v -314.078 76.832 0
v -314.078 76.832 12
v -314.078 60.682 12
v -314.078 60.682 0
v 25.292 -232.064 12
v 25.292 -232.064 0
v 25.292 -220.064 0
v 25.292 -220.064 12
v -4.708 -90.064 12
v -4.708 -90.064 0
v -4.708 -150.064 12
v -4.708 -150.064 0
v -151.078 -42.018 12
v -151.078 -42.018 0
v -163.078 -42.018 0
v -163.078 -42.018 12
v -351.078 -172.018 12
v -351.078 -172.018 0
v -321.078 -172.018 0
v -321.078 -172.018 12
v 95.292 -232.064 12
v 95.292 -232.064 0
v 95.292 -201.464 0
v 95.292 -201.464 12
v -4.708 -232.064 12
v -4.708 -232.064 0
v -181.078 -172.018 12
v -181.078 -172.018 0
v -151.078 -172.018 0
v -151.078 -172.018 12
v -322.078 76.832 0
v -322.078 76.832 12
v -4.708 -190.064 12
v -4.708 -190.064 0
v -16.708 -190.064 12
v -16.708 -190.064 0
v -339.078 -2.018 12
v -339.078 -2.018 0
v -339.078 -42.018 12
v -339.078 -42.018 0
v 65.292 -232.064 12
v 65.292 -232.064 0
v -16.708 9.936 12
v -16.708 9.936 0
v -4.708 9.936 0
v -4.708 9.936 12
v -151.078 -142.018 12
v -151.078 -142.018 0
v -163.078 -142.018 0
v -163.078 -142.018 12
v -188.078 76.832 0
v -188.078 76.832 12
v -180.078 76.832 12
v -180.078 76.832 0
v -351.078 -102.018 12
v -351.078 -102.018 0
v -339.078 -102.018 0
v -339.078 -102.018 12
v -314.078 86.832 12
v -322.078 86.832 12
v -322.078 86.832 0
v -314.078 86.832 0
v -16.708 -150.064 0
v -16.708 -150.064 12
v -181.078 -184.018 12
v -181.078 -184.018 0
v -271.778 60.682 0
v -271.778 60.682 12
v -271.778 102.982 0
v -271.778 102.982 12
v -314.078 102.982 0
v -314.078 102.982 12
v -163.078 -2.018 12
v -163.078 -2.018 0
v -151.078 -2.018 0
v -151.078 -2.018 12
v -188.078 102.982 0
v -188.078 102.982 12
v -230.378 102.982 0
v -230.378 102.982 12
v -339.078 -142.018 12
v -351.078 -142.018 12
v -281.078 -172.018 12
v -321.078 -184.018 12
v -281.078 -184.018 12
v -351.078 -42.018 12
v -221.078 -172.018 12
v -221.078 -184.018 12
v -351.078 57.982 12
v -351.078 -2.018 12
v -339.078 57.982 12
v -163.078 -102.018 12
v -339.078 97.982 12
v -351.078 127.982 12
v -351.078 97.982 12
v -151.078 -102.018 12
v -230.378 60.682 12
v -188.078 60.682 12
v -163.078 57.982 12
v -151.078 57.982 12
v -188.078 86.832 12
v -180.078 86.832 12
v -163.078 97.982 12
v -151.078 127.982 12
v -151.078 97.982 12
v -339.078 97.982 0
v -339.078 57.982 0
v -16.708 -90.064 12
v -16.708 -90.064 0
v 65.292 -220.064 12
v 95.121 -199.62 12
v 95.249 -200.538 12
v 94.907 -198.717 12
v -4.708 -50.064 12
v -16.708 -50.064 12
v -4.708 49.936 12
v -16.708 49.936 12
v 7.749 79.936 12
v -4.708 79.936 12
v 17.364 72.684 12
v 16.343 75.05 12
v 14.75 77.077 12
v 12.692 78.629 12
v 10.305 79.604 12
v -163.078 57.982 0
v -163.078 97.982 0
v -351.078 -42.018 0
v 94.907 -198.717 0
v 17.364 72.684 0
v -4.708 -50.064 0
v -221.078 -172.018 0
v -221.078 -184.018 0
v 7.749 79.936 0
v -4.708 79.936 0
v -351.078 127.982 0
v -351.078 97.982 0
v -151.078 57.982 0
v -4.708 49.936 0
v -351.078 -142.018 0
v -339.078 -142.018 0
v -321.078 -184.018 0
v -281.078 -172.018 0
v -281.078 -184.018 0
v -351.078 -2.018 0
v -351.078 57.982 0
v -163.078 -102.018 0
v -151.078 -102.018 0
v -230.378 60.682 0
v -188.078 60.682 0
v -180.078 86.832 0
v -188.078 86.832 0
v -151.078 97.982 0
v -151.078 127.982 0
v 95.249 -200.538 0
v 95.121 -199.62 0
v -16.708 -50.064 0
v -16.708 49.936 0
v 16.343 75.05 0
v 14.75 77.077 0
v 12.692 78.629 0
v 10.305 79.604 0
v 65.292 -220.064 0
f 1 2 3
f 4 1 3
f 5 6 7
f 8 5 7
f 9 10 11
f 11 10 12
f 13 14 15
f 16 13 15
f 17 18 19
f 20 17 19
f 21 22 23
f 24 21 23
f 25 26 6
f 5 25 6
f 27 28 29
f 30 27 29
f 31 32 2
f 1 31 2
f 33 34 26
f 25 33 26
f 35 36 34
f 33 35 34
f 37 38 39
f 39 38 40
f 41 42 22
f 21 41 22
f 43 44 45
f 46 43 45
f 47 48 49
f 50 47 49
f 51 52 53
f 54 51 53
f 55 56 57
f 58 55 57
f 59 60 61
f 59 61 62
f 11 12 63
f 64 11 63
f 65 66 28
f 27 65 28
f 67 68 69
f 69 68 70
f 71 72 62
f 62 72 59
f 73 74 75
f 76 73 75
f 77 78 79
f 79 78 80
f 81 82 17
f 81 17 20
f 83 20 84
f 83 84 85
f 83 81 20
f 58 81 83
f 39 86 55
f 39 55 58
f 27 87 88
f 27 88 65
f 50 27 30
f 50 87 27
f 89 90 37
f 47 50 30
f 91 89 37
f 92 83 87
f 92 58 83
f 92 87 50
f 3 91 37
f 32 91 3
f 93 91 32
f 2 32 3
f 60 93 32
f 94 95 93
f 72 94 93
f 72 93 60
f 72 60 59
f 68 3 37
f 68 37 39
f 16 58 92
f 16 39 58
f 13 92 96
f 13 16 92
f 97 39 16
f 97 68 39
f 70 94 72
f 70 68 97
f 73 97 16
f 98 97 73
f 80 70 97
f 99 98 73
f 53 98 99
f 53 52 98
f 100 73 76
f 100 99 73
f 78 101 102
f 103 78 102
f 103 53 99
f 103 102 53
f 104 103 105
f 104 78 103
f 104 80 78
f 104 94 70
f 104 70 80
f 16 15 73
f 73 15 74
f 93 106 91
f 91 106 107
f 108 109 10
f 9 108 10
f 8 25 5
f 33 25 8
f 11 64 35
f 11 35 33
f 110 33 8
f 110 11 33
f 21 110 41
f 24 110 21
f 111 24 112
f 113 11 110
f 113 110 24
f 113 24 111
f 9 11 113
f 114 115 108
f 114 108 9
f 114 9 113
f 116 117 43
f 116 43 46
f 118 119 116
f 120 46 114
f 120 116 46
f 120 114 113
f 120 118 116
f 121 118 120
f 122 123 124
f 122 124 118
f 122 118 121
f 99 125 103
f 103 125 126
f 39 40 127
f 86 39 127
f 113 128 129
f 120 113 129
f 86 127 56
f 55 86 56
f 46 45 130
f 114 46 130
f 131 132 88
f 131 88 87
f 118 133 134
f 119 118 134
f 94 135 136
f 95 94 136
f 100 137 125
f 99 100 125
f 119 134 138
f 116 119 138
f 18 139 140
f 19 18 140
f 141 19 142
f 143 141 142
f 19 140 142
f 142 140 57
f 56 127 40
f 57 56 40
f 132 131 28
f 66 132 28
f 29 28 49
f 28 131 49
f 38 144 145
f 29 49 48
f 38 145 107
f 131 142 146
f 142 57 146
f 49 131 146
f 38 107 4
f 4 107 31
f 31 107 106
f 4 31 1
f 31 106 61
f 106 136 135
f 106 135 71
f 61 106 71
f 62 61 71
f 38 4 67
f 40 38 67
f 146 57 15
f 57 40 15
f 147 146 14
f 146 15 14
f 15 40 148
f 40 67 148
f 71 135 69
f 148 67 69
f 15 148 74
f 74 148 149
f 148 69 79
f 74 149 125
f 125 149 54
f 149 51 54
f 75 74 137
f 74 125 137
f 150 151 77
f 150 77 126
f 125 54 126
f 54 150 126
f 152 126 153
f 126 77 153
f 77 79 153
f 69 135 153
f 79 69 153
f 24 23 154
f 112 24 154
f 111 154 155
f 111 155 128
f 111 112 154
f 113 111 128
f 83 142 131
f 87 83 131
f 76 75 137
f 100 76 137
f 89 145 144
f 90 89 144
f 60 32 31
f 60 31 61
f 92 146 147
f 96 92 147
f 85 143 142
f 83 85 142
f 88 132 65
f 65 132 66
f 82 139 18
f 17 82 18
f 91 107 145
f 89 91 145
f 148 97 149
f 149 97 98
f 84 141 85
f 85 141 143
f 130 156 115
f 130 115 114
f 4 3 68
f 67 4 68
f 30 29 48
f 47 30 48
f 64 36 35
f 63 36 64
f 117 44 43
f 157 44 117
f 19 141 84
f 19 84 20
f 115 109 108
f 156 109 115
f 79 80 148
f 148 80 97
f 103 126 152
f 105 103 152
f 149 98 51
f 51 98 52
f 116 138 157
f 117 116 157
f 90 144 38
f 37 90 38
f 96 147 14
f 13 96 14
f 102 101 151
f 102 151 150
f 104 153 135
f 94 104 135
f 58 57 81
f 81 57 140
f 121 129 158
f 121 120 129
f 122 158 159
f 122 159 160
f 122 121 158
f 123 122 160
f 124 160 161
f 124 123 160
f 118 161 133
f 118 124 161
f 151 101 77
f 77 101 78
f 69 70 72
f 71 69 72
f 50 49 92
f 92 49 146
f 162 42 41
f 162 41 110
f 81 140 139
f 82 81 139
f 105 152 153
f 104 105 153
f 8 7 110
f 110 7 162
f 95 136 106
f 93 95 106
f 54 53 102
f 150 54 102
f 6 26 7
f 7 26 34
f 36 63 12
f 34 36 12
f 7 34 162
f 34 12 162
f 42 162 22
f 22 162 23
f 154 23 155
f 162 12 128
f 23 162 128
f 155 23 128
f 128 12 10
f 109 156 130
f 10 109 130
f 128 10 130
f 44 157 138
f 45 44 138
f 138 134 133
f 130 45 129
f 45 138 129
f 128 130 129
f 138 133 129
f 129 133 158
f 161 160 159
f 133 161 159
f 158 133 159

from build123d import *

# Parameters (mm, degrees)
F1_W     = 12
F1_H     = 40
F1_W_2   = 30
F1_H_2   = 12
F2_DEPTH = 12
F3_R     = 10
F4_W     = 40
F4_H     = 12
F5_DEPTH = 12
F6_W     = 8
F6_H     = 10
F7_DEPTH = 12


with BuildPart() as f2:
    # F1 (on Top) → F2 (new body)
    with BuildSketch(Plane.XY):
        with Locations((-10.7078695893, 29.9363255501)):
            Rectangle(F1_W, F1_H)
        with Locations((80.2921304107, -226.0636744499)):
            Rectangle(F1_W_2, F1_H_2)
        with Locations((10.2921304107, -226.0636744499)):
            Rectangle(F1_W_2, F1_H_2)
        with Locations((-10.7078695893, -170.0636744499)):
            Rectangle(F1_W, F1_H)
        with Locations((1.2921304107, 29.9363255501)):
            Rectangle(F1_W, F1_H)
        with Locations((1.2921304107, -170.0636744499)):
            Rectangle(F1_W, F1_H)
        Polygon((15.2921304107, 79.9363255501), (-4.7078695893, 79.9363255501), (-4.7078695893, 49.9363255501), (7.2921304107, 49.9363255501), (7.2921304107, 9.9363255501), (-4.7078695893, 9.9363255501), (-4.7078695893, -50.0636744499), (7.2921304107, -50.0636744499), (7.2921304107, -90.0636744499), (-4.7078695893, -90.0636744499), (-4.7078695893, -150.0636744499), (7.2921304107, -150.0636744499), (7.2921304107, -190.0636744499), (-4.7078695893, -190.0636744499), (-4.7078695893, -220.0636744499), (25.2921304107, -220.0636744499), (65.2921304107, -220.0636744499), (95.2921304107, -220.0636744499), (95.2921304107, -200.0636744499), align=None)
        with Locations((1.2921304107, -70.0636744499)):
            Rectangle(F1_W, F1_H)
        with Locations((-10.7078695893, -70.0636744499)):
            Rectangle(F1_W, F1_H)
    extrude(amount=F2_DEPTH)

    # F3
    f3_edges = [f2.edges().sort_by_distance(p)[0] for p in [
        (95.29213, -200.063674, 6),
        (15.29213, 79.936326, 6),
    ]]
    fillet(f3_edges, radius=F3_R)


with BuildPart() as f5:
    # F4 (on Top) → F5 (new body)
    with BuildSketch(Plane.XY):
        with Locations((-201.0779124498, -178.0181848854)):
            Rectangle(F4_W, F4_H)
        with Locations((-301.0779124498, -178.0181848854)):
            Rectangle(F4_W, F4_H)
        Polygon((-181.0779124498, -172.0181848854), (-151.0779124498, -172.0181848854), (-151.0779124498, -142.0181848854), (-163.0779124498, -142.0181848854), (-163.0779124498, -102.0181848854), (-151.0779124498, -102.0181848854), (-151.0779124498, -42.0181848854), (-163.0779124498, -42.0181848854), (-163.0779124498, -2.0181848854), (-151.0779124498, -2.0181848854), (-151.0779124498, 57.9818151146), (-163.0779124498, 57.9818151146), (-163.0779124498, 97.9818151146), (-151.0779124498, 97.9818151146), (-151.0779124498, 127.9818151146), (-351.0779124498, 127.9818151146), (-351.0779124498, 97.9818151146), (-339.0779124498, 97.9818151146), (-339.0779124498, 57.9818151146), (-351.0779124498, 57.9818151146), (-351.0779124498, -2.0181848854), (-339.0779124498, -2.0181848854), (-339.0779124498, -42.0181848854), (-351.0779124498, -42.0181848854), (-351.0779124498, -102.0181848854), (-339.0779124498, -102.0181848854), (-339.0779124498, -142.0181848854), (-351.0779124498, -142.0181848854), (-351.0779124498, -172.0181848854), (-321.0779124498, -172.0181848854), (-321.0779124498, -160.0181848854), (-281.0779124498, -160.0181848854), (-281.0779124498, -172.0181848854), (-221.0779124498, -172.0181848854), (-221.0779124498, -160.0181848854), (-181.0779124498, -160.0181848854), align=None)
        with Locations((-201.0779124498, -166.0181848854)):
            Rectangle(F4_W, F4_H)
        with Locations((-301.0779124498, -166.0181848854)):
            Rectangle(F4_W, F4_H)
    extrude(amount=F5_DEPTH)

    # F6 (on face) → F7 (cut, through all)
    with BuildSketch(Plane.XY.offset(12)):
        with Locations((-318.0779124498, 81.8318151146)):
            Rectangle(F6_W, F6_H)
        Polygon((-271.7779124498, 102.9818151146), (-314.0779124498, 102.9818151146), (-314.0779124498, 86.8318151146), (-306.0779124498, 86.8318151146), (-306.0779124498, 76.8318151146), (-314.0779124498, 76.8318151146), (-314.0779124498, 60.6818151146), (-271.7779124498, 60.6818151146), align=None)
        with Locations((-310.0779124498, 81.8318151146)):
            Rectangle(F6_W, F6_H)
        with Locations((-192.0779124498, 81.8318151146)):
            Rectangle(F6_W, F6_H)
        Polygon((-188.0779124498, 60.6818151146), (-188.0779124498, 76.8318151146), (-196.0779124498, 76.8318151146), (-196.0779124498, 86.8318151146), (-188.0779124498, 86.8318151146), (-188.0779124498, 102.9818151146), (-230.3779124498, 102.9818151146), (-230.3779124498, 60.6818151146), align=None)
        with Locations((-184.0779124498, 81.8318151146)):
            Rectangle(F6_W, F6_H)
    extrude(amount=-F7_DEPTH, mode=Mode.SUBTRACT)


solid = Compound([f2.part, f5.part])
